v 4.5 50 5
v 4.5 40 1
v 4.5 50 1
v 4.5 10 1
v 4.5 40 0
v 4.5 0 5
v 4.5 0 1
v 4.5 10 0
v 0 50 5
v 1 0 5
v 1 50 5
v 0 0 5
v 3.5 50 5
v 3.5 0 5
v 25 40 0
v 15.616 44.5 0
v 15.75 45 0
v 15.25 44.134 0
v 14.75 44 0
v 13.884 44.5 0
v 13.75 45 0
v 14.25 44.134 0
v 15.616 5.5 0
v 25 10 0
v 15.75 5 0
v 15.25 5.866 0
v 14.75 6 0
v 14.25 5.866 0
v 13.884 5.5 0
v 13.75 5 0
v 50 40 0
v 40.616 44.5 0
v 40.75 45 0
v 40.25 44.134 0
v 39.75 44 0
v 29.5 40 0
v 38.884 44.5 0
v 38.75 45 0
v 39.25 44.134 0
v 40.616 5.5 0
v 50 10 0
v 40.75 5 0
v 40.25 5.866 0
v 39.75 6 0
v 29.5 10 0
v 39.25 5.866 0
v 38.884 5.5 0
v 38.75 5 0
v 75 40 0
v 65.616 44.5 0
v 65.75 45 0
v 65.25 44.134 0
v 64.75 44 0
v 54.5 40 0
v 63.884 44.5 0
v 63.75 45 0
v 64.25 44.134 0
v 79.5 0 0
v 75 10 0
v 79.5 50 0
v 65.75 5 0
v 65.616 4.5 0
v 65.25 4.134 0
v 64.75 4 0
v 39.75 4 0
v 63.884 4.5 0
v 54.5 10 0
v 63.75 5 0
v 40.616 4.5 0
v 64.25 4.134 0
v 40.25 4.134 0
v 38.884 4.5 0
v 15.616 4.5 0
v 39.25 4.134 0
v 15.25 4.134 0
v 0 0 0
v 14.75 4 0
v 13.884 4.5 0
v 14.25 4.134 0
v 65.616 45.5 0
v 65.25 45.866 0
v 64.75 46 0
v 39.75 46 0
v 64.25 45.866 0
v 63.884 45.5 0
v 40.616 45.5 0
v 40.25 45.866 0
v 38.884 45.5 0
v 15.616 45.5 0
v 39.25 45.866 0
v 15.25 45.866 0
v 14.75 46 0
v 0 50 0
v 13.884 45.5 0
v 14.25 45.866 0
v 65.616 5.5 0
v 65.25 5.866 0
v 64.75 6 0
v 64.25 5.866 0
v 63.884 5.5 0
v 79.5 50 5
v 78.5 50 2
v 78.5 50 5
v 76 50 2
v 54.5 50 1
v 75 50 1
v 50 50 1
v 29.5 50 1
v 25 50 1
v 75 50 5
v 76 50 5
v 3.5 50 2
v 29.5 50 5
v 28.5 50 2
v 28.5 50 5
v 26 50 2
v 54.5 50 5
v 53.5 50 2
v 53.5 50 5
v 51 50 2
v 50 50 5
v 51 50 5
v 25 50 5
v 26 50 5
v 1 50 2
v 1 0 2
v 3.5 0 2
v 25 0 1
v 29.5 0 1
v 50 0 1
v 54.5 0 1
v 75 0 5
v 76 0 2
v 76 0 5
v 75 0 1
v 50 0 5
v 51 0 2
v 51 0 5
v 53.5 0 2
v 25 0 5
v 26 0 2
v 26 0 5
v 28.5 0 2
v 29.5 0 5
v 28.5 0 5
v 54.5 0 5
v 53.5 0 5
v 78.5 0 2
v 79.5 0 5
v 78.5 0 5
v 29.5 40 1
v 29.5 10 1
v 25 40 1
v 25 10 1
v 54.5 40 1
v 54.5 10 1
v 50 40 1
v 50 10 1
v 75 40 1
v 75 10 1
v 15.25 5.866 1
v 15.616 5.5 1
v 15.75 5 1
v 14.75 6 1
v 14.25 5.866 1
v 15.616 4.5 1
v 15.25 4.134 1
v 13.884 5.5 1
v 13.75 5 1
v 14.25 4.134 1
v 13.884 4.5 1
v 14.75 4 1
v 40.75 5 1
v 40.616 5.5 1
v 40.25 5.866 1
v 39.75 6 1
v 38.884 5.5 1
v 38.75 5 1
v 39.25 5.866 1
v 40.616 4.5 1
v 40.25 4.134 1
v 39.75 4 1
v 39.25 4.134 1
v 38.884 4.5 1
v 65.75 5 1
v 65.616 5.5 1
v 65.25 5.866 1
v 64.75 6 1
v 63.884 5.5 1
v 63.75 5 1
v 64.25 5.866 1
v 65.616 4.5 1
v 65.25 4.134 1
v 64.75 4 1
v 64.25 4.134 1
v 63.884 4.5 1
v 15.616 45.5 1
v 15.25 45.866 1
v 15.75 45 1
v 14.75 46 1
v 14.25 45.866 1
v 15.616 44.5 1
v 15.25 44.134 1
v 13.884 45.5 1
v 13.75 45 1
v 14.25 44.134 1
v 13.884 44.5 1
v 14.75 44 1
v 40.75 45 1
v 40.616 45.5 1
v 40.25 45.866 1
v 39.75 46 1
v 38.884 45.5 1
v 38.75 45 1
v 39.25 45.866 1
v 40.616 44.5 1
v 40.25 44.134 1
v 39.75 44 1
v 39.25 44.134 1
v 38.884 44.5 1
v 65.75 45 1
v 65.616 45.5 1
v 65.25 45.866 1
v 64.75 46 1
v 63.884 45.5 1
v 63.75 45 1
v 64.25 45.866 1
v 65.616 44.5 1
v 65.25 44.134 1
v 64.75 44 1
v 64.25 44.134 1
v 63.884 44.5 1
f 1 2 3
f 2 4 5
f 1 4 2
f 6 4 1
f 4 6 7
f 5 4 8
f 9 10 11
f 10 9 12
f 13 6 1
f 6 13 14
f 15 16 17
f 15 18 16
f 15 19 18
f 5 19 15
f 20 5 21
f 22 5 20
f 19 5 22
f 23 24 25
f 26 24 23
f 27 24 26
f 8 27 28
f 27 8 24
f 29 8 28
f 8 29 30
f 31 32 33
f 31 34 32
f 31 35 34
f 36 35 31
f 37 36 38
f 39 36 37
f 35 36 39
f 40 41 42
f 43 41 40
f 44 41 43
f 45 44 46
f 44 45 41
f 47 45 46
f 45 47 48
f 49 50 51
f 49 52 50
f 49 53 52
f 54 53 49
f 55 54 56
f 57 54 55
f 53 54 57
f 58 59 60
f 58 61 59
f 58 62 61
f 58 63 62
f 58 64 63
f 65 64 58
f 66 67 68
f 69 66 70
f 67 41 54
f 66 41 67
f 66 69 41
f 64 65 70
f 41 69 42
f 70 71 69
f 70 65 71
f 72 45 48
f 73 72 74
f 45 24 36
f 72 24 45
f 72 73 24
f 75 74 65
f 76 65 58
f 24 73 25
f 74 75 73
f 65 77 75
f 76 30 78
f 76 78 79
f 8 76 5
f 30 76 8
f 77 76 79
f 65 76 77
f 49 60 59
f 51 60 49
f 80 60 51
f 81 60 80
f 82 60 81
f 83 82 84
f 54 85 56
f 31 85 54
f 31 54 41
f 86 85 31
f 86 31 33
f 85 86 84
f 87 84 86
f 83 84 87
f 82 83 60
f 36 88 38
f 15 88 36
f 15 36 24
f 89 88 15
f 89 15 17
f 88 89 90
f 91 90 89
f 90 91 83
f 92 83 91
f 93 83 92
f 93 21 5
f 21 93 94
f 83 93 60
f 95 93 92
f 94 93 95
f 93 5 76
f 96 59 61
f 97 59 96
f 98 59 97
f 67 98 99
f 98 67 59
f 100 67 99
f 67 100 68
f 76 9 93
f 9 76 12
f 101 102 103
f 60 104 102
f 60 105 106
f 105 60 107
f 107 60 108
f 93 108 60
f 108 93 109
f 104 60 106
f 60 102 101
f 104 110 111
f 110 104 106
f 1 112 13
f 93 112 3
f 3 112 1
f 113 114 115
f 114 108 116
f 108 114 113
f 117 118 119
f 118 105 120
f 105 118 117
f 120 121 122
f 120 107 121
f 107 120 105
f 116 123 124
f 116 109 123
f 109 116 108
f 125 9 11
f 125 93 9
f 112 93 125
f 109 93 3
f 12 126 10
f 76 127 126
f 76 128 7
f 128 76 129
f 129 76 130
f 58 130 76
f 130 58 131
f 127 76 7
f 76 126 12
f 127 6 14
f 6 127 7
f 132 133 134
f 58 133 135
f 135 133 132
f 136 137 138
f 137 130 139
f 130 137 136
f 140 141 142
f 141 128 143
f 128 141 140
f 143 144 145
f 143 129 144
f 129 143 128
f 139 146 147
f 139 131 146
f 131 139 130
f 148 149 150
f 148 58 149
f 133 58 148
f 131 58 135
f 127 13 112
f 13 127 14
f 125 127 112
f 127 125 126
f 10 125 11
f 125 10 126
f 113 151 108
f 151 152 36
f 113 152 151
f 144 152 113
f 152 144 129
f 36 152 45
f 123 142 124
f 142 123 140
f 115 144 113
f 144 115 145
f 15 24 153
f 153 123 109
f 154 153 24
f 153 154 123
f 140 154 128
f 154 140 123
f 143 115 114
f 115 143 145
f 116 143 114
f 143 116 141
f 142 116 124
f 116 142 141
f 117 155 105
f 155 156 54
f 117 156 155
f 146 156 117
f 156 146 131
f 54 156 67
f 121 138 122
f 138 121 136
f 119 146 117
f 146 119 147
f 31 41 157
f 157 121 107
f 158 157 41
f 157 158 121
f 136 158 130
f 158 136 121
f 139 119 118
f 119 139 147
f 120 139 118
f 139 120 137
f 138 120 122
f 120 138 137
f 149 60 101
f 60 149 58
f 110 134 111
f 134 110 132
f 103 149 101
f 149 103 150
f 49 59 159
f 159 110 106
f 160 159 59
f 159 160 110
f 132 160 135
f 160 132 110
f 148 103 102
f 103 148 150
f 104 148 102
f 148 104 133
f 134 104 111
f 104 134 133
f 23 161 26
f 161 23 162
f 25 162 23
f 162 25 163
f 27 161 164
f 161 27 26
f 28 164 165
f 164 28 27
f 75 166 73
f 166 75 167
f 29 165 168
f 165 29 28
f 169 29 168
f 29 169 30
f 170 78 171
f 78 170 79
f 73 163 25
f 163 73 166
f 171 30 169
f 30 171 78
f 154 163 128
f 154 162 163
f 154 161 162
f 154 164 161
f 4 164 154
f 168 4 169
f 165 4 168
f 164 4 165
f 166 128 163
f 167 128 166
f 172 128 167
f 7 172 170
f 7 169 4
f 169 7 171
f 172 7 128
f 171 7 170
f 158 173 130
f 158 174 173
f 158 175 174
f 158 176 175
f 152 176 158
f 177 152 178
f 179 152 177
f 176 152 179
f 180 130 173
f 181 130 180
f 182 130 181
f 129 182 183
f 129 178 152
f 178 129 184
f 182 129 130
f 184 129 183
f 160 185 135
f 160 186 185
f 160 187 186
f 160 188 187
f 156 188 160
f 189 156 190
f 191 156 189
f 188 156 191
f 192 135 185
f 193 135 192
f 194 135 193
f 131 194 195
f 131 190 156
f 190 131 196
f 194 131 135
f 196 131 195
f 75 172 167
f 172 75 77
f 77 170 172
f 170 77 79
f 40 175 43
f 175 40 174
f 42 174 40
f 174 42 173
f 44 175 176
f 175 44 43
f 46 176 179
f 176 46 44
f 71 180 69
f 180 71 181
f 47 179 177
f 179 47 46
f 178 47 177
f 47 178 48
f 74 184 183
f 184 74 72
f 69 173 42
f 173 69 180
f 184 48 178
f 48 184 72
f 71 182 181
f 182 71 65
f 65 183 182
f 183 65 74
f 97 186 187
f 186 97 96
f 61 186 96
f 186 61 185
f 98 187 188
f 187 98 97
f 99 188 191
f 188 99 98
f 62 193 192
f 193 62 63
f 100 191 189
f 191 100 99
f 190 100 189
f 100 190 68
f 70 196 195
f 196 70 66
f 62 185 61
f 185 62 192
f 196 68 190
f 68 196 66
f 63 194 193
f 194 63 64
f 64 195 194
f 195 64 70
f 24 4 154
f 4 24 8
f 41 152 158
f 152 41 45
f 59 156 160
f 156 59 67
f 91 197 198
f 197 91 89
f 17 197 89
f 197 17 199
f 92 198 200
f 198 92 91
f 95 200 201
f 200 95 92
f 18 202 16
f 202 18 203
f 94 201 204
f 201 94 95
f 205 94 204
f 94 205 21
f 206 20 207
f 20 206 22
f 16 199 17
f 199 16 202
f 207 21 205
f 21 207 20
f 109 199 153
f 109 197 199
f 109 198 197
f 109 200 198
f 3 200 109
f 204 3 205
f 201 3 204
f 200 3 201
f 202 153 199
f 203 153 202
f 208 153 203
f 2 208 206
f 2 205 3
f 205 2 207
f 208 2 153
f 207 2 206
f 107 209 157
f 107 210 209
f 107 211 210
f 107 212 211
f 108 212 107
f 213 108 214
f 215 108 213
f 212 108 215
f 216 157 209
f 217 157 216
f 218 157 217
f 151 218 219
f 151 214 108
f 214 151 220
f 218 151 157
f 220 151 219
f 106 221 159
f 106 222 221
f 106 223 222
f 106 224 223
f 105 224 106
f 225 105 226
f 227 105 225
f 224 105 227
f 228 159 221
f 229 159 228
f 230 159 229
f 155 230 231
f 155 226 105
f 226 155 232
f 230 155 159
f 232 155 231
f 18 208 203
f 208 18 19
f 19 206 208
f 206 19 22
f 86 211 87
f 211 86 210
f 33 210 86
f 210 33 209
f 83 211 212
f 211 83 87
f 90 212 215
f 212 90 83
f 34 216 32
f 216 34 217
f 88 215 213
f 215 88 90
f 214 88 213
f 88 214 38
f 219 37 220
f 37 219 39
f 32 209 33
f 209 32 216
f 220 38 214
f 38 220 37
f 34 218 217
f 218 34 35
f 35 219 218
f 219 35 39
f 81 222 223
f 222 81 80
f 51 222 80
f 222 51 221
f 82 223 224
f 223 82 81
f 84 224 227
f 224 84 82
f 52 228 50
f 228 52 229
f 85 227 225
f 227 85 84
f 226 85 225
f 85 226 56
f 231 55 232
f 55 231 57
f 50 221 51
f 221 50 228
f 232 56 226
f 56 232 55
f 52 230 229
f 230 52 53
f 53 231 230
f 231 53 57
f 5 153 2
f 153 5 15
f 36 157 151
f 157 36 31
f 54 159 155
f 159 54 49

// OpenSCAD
// See bottom for parameters

module holder(depth=50, wall_thickness=1, slots=4, slot_width=2.5, slot_depth=3, slot_depth_padding=1, slot_spacing=25) {
    holder_height = slot_depth + slot_depth_padding + wall_thickness;
    holder_wall_thickness = wall_thickness;
    holder_width = holder_wall_thickness * 2 + slot_width;
    holder_depth = depth < 10 ? 10 : depth;

    slot_count = slots -1;

    brace_width = holder_width < 10 ? 10 : holder_width;
    brace_length = slot_spacing * slot_count + holder_width;

    // Slots
    for (i=[0:slot_count]) {
        translate([i * slot_spacing, 0, 0])
        difference() {
            cube([holder_width,holder_depth,holder_height]);

            translate([holder_width-holder_wall_thickness-slot_width,0,holder_height-slot_depth])
                cube([slot_width,holder_depth,slot_depth]);
        };
    }

    // Braces
    for (i=[0:1]) {
        translate([0, (holder_depth - brace_width) * i, 0]) {
            difference() {
                // Brace
                cube([brace_length, brace_width, holder_wall_thickness]);

                // Brace holes
                brace_hole_size = 2;
                brace_hole_x_location = (
                    (slot_width + wall_thickness * 2) + (slot_spacing - wall_thickness * 2 - slot_width) / 2 - brace_hole_size/2
                );
                brace_hole_y_location = (brace_width / 2) - brace_hole_size/2;
                for (i=[0:slot_count - 1]) {
                    translate([brace_hole_x_location + slot_spacing * i + brace_hole_size/2, brace_hole_y_location + brace_hole_size/2, 0])
                    cylinder(r=brace_hole_size/2, h=wall_thickness, $fn=12);
                }
            }
        }
    }

    echo(str("Width:  ", brace_length, "mm"));
    echo(str("Depth:  ", holder_depth, "mm"));
    echo(str("Height: ", holder_height, "mm"));
}


holder(
    depth=50,               // Depth of the holder
    wall_thickness=1,       // Thickness of all walls
    slots=4,                // Amount of slots (16 fits width of a standard rack)
    slot_width=2.5,         // Width of the slots
    slot_depth=3,           // Depth of the slots
    slot_depth_padding=1,   // Extra padding for the slot depth, in addition to the wall thickness
    slot_spacing=25         // Spacing between each slot
);
